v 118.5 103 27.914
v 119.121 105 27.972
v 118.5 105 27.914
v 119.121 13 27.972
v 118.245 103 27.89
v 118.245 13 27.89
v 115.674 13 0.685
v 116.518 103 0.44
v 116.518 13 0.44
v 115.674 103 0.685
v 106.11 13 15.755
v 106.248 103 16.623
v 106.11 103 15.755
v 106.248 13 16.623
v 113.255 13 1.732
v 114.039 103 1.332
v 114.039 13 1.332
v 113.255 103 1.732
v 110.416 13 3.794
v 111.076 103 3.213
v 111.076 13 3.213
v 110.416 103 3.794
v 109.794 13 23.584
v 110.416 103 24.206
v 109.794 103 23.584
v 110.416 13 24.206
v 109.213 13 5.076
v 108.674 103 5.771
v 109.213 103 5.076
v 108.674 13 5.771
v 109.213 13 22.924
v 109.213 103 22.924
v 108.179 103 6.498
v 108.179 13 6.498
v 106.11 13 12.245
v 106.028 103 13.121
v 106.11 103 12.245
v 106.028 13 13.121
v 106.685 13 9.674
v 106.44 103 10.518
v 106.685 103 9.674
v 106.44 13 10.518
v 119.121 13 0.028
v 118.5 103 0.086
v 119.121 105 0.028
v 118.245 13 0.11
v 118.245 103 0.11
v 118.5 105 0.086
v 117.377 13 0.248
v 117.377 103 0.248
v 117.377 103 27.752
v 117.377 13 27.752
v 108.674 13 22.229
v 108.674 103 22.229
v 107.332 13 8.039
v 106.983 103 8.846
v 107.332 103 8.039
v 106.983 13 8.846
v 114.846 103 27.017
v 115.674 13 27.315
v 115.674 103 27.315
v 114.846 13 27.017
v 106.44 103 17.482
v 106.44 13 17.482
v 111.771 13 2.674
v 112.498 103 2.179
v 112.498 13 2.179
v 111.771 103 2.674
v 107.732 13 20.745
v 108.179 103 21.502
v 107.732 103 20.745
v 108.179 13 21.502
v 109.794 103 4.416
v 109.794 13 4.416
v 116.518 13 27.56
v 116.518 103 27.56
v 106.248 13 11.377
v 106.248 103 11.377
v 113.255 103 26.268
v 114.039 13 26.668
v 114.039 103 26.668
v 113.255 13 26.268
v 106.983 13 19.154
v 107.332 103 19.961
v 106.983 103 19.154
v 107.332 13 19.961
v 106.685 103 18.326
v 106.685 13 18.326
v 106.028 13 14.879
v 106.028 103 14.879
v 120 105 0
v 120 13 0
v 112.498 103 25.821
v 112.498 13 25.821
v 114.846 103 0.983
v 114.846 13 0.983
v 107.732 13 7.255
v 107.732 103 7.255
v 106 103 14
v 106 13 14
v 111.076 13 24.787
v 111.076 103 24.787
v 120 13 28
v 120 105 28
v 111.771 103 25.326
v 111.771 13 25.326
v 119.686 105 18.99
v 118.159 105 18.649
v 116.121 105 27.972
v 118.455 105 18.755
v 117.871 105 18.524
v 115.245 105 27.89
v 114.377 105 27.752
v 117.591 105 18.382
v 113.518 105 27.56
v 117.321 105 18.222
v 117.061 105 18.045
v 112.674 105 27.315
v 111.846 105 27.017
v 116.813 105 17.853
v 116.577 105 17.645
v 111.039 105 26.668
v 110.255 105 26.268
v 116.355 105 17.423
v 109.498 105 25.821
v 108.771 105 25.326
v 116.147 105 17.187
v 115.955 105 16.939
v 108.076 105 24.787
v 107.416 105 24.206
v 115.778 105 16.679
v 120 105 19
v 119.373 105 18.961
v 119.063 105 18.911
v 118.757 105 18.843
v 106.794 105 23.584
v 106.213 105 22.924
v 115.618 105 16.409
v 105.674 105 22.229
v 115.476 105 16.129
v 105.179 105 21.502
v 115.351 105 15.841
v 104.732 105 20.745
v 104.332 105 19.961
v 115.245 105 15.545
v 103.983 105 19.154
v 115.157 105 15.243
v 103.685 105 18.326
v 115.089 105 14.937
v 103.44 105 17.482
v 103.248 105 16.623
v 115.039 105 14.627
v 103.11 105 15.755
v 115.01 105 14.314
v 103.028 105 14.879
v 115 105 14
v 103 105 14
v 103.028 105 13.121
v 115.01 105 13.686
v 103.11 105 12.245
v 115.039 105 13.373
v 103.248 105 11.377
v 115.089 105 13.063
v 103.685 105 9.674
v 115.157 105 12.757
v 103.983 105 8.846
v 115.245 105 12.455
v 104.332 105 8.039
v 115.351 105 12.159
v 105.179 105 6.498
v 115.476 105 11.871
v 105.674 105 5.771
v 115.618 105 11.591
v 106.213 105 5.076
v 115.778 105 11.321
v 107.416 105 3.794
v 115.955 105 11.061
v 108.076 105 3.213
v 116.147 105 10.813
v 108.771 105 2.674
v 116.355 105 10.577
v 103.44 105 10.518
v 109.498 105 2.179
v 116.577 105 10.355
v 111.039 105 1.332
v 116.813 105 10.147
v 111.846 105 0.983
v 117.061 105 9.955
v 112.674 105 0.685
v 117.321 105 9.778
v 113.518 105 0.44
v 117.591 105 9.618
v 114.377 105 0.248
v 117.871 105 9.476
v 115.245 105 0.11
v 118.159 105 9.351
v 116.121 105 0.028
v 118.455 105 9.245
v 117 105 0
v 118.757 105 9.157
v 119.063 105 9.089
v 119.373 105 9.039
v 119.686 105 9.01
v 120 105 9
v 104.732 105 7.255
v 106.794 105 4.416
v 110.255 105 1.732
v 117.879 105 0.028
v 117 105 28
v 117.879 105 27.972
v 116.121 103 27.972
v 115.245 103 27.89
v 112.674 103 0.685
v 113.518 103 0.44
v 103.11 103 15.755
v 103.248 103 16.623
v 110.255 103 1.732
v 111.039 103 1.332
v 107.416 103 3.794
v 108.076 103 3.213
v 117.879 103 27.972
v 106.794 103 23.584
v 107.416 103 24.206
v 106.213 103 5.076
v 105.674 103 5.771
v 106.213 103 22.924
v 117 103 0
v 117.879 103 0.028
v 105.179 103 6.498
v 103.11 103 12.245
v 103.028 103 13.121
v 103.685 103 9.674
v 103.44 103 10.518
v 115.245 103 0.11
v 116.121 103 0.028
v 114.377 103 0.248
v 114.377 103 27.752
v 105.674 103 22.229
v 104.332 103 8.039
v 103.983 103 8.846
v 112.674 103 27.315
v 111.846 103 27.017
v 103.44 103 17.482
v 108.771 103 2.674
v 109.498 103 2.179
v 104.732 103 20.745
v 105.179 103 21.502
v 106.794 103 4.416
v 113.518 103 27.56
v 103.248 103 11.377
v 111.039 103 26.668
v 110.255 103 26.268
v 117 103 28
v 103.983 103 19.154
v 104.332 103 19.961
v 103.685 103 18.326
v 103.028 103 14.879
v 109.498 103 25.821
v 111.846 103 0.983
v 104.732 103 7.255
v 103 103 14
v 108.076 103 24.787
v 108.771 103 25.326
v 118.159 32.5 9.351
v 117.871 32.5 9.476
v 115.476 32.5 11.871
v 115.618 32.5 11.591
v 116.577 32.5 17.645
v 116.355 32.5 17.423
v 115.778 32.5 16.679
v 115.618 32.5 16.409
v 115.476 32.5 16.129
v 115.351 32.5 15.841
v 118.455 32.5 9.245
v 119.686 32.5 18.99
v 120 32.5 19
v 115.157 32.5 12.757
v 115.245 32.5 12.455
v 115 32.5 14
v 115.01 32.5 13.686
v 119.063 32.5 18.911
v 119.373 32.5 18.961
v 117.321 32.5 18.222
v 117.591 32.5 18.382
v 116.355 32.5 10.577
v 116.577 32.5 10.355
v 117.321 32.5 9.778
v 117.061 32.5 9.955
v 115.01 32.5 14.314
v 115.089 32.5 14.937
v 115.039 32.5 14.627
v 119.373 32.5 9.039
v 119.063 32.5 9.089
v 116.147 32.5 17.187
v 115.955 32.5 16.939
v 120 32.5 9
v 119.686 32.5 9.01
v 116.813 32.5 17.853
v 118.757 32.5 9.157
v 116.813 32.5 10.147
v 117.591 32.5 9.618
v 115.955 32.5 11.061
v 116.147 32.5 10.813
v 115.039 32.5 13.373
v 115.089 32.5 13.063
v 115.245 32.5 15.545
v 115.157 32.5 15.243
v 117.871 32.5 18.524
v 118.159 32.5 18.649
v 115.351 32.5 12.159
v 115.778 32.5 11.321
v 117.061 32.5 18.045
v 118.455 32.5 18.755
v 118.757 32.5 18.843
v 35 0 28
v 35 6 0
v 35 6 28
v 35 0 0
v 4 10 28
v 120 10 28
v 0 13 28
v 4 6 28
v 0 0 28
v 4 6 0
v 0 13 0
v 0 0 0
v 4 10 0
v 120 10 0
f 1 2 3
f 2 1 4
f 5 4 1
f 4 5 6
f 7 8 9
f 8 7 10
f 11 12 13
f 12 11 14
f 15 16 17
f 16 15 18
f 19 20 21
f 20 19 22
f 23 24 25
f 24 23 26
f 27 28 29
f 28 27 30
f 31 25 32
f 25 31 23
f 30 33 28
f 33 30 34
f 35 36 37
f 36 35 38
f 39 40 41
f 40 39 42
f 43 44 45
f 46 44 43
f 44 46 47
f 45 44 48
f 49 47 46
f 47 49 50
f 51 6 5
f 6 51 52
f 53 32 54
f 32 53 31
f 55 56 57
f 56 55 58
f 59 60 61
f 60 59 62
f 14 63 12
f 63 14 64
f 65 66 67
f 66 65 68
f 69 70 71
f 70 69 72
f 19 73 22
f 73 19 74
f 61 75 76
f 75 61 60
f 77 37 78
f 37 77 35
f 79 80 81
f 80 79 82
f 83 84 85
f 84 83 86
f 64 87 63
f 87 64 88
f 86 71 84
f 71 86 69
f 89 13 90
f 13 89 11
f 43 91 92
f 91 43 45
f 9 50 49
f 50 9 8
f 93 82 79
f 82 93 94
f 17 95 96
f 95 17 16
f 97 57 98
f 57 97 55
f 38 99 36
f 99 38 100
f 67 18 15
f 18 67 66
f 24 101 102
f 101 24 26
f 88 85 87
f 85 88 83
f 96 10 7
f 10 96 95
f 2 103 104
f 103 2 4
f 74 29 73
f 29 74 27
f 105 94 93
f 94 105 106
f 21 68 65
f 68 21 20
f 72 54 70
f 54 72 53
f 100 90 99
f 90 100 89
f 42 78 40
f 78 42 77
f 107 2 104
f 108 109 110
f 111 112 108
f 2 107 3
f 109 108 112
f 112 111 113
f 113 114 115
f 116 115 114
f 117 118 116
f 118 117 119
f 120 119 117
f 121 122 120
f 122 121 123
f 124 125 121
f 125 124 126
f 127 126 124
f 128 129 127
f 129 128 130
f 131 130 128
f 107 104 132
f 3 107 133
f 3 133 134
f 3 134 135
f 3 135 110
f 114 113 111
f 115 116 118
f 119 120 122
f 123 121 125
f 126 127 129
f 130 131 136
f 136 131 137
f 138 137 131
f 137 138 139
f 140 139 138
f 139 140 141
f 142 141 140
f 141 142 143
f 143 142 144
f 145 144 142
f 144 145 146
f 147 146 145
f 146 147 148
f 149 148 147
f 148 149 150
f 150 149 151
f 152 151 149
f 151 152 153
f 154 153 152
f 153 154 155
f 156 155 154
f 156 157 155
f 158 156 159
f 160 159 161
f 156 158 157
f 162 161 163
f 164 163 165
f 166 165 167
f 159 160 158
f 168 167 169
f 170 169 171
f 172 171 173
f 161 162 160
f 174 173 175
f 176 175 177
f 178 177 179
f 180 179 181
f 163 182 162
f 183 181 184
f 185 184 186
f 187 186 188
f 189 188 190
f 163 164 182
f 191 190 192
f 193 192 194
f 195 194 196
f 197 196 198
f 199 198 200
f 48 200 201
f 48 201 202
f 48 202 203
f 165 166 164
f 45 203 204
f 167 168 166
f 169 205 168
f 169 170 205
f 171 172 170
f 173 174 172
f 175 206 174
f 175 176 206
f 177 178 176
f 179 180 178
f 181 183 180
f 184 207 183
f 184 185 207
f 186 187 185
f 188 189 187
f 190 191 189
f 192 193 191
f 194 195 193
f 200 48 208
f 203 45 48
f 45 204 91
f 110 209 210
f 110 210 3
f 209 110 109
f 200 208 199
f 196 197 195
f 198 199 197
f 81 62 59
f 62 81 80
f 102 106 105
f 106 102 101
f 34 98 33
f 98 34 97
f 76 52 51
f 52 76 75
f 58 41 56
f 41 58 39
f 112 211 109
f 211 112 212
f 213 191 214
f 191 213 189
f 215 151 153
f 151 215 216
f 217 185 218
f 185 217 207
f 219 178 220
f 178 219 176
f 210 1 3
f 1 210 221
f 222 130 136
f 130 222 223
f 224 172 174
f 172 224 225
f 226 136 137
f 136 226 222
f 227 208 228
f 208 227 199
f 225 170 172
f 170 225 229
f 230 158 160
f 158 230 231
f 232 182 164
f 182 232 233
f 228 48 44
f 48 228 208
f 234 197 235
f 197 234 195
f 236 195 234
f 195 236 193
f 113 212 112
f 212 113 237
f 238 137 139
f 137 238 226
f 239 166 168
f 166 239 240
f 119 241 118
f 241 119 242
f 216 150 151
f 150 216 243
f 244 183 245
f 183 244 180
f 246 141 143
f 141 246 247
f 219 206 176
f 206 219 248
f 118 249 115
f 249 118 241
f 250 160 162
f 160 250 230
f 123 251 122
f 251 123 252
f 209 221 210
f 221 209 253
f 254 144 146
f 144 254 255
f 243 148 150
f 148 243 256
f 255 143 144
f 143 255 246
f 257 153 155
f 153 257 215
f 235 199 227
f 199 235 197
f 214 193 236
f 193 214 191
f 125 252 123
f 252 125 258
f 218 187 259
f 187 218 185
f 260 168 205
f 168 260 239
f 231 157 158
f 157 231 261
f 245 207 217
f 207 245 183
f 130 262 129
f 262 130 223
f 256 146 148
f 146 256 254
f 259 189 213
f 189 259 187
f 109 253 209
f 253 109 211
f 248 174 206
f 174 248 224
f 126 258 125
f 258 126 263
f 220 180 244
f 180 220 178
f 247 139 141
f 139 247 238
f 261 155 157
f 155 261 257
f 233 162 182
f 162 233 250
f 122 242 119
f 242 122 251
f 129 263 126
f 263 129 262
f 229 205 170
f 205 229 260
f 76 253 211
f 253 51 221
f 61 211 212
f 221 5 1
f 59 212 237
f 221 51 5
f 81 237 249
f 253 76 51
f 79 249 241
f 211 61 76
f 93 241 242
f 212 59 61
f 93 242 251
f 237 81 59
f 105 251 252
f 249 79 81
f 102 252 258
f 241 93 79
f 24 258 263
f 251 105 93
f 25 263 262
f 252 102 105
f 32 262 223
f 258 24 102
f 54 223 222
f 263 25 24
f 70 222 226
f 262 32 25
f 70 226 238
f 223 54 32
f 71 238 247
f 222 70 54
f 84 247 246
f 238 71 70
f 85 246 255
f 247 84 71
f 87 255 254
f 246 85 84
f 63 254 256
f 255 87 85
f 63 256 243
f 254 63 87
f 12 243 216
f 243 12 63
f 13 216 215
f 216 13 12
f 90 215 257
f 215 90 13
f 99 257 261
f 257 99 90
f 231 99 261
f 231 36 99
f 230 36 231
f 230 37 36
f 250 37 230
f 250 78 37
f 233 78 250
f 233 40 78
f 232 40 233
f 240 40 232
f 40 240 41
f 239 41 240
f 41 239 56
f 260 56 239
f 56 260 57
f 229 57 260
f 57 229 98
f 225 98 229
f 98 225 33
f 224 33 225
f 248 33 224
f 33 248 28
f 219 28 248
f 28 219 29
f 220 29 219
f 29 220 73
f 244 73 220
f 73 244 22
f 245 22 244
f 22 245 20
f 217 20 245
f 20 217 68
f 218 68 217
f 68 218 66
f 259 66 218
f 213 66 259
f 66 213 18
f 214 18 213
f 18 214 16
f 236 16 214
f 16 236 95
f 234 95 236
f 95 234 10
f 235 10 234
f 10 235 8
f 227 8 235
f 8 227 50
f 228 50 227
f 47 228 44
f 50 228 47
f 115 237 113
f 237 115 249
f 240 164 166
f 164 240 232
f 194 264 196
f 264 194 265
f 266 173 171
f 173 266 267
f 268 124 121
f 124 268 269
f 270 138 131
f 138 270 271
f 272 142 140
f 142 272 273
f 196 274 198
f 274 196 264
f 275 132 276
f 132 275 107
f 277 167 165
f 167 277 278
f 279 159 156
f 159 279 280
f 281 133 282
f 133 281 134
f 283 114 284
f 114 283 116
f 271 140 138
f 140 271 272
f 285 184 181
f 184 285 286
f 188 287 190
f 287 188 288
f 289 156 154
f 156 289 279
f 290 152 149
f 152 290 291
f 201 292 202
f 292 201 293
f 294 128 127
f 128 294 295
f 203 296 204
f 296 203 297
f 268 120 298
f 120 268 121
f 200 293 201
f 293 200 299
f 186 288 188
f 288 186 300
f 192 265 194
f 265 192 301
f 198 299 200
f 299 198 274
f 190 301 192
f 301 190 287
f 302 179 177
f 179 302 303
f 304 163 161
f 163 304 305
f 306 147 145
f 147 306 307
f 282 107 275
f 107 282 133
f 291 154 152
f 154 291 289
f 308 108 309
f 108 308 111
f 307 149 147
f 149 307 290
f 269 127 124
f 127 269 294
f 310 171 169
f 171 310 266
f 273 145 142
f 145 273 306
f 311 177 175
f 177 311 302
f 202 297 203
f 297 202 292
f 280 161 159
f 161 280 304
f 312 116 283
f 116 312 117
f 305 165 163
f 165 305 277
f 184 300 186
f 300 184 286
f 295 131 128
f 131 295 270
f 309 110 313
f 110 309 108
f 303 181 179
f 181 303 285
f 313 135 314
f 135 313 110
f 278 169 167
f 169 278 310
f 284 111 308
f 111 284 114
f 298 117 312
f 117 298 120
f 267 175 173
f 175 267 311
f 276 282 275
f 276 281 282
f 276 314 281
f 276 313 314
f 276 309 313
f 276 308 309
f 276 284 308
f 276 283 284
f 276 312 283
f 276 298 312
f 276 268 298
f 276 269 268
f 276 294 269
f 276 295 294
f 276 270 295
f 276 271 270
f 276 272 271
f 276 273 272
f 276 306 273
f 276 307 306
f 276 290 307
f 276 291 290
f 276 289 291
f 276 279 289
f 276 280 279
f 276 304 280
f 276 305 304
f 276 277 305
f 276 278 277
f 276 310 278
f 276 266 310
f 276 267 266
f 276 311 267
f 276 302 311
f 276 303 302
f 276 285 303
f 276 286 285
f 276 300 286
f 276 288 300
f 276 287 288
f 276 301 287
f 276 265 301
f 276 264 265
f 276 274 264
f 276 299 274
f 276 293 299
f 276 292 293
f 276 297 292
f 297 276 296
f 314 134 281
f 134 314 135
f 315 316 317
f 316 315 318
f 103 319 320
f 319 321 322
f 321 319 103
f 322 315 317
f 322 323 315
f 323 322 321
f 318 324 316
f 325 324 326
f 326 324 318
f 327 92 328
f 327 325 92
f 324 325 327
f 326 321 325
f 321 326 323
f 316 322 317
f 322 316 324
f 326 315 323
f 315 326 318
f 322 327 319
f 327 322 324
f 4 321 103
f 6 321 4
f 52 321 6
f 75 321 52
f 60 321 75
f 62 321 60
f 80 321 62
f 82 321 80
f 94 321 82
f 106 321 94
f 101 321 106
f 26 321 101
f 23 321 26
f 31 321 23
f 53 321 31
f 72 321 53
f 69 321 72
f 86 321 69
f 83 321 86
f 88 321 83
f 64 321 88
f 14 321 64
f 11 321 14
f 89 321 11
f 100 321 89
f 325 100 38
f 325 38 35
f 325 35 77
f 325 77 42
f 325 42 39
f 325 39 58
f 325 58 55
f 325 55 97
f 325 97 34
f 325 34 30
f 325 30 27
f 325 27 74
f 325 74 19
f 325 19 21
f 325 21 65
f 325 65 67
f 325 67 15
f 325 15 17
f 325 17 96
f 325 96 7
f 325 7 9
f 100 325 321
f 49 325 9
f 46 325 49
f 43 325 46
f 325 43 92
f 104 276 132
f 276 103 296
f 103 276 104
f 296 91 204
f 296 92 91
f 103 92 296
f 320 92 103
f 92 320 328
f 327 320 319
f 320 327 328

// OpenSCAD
// diameter of the rod
d=28;
// length of the rod
l=90;
// height of the rod
height=120; // [35:350]

difference() {
	union() {
		cube([35,6,d]);
		cube([4,13,d]);
		translate([0,10,0]) {
			cube([height,3,d]);
		}
		difference() {
			union() {
				translate([height,12,d/2]) {
					rotate([-90,0,0]) {
						cylinder(r=d/2, h=l+1+2, $fn=100);
					}
				}
				translate([height-3,12+1+l,d/2]) {
					rotate([-90,0,0]) {
						cylinder(r=d/2, h=2, $fn=100);
					}
				}
			}
			translate([height,10+l/4,d/2]) {
				rotate([-90,0,0]) {
					cylinder(r=d/2-9, h=l+1+2+10, $fn=100);
				}
			}
		}
	}
	translate([height,0,-1]) {
		cube([d/2+1,l+12+1+2+1,d+2]);
	}
}
